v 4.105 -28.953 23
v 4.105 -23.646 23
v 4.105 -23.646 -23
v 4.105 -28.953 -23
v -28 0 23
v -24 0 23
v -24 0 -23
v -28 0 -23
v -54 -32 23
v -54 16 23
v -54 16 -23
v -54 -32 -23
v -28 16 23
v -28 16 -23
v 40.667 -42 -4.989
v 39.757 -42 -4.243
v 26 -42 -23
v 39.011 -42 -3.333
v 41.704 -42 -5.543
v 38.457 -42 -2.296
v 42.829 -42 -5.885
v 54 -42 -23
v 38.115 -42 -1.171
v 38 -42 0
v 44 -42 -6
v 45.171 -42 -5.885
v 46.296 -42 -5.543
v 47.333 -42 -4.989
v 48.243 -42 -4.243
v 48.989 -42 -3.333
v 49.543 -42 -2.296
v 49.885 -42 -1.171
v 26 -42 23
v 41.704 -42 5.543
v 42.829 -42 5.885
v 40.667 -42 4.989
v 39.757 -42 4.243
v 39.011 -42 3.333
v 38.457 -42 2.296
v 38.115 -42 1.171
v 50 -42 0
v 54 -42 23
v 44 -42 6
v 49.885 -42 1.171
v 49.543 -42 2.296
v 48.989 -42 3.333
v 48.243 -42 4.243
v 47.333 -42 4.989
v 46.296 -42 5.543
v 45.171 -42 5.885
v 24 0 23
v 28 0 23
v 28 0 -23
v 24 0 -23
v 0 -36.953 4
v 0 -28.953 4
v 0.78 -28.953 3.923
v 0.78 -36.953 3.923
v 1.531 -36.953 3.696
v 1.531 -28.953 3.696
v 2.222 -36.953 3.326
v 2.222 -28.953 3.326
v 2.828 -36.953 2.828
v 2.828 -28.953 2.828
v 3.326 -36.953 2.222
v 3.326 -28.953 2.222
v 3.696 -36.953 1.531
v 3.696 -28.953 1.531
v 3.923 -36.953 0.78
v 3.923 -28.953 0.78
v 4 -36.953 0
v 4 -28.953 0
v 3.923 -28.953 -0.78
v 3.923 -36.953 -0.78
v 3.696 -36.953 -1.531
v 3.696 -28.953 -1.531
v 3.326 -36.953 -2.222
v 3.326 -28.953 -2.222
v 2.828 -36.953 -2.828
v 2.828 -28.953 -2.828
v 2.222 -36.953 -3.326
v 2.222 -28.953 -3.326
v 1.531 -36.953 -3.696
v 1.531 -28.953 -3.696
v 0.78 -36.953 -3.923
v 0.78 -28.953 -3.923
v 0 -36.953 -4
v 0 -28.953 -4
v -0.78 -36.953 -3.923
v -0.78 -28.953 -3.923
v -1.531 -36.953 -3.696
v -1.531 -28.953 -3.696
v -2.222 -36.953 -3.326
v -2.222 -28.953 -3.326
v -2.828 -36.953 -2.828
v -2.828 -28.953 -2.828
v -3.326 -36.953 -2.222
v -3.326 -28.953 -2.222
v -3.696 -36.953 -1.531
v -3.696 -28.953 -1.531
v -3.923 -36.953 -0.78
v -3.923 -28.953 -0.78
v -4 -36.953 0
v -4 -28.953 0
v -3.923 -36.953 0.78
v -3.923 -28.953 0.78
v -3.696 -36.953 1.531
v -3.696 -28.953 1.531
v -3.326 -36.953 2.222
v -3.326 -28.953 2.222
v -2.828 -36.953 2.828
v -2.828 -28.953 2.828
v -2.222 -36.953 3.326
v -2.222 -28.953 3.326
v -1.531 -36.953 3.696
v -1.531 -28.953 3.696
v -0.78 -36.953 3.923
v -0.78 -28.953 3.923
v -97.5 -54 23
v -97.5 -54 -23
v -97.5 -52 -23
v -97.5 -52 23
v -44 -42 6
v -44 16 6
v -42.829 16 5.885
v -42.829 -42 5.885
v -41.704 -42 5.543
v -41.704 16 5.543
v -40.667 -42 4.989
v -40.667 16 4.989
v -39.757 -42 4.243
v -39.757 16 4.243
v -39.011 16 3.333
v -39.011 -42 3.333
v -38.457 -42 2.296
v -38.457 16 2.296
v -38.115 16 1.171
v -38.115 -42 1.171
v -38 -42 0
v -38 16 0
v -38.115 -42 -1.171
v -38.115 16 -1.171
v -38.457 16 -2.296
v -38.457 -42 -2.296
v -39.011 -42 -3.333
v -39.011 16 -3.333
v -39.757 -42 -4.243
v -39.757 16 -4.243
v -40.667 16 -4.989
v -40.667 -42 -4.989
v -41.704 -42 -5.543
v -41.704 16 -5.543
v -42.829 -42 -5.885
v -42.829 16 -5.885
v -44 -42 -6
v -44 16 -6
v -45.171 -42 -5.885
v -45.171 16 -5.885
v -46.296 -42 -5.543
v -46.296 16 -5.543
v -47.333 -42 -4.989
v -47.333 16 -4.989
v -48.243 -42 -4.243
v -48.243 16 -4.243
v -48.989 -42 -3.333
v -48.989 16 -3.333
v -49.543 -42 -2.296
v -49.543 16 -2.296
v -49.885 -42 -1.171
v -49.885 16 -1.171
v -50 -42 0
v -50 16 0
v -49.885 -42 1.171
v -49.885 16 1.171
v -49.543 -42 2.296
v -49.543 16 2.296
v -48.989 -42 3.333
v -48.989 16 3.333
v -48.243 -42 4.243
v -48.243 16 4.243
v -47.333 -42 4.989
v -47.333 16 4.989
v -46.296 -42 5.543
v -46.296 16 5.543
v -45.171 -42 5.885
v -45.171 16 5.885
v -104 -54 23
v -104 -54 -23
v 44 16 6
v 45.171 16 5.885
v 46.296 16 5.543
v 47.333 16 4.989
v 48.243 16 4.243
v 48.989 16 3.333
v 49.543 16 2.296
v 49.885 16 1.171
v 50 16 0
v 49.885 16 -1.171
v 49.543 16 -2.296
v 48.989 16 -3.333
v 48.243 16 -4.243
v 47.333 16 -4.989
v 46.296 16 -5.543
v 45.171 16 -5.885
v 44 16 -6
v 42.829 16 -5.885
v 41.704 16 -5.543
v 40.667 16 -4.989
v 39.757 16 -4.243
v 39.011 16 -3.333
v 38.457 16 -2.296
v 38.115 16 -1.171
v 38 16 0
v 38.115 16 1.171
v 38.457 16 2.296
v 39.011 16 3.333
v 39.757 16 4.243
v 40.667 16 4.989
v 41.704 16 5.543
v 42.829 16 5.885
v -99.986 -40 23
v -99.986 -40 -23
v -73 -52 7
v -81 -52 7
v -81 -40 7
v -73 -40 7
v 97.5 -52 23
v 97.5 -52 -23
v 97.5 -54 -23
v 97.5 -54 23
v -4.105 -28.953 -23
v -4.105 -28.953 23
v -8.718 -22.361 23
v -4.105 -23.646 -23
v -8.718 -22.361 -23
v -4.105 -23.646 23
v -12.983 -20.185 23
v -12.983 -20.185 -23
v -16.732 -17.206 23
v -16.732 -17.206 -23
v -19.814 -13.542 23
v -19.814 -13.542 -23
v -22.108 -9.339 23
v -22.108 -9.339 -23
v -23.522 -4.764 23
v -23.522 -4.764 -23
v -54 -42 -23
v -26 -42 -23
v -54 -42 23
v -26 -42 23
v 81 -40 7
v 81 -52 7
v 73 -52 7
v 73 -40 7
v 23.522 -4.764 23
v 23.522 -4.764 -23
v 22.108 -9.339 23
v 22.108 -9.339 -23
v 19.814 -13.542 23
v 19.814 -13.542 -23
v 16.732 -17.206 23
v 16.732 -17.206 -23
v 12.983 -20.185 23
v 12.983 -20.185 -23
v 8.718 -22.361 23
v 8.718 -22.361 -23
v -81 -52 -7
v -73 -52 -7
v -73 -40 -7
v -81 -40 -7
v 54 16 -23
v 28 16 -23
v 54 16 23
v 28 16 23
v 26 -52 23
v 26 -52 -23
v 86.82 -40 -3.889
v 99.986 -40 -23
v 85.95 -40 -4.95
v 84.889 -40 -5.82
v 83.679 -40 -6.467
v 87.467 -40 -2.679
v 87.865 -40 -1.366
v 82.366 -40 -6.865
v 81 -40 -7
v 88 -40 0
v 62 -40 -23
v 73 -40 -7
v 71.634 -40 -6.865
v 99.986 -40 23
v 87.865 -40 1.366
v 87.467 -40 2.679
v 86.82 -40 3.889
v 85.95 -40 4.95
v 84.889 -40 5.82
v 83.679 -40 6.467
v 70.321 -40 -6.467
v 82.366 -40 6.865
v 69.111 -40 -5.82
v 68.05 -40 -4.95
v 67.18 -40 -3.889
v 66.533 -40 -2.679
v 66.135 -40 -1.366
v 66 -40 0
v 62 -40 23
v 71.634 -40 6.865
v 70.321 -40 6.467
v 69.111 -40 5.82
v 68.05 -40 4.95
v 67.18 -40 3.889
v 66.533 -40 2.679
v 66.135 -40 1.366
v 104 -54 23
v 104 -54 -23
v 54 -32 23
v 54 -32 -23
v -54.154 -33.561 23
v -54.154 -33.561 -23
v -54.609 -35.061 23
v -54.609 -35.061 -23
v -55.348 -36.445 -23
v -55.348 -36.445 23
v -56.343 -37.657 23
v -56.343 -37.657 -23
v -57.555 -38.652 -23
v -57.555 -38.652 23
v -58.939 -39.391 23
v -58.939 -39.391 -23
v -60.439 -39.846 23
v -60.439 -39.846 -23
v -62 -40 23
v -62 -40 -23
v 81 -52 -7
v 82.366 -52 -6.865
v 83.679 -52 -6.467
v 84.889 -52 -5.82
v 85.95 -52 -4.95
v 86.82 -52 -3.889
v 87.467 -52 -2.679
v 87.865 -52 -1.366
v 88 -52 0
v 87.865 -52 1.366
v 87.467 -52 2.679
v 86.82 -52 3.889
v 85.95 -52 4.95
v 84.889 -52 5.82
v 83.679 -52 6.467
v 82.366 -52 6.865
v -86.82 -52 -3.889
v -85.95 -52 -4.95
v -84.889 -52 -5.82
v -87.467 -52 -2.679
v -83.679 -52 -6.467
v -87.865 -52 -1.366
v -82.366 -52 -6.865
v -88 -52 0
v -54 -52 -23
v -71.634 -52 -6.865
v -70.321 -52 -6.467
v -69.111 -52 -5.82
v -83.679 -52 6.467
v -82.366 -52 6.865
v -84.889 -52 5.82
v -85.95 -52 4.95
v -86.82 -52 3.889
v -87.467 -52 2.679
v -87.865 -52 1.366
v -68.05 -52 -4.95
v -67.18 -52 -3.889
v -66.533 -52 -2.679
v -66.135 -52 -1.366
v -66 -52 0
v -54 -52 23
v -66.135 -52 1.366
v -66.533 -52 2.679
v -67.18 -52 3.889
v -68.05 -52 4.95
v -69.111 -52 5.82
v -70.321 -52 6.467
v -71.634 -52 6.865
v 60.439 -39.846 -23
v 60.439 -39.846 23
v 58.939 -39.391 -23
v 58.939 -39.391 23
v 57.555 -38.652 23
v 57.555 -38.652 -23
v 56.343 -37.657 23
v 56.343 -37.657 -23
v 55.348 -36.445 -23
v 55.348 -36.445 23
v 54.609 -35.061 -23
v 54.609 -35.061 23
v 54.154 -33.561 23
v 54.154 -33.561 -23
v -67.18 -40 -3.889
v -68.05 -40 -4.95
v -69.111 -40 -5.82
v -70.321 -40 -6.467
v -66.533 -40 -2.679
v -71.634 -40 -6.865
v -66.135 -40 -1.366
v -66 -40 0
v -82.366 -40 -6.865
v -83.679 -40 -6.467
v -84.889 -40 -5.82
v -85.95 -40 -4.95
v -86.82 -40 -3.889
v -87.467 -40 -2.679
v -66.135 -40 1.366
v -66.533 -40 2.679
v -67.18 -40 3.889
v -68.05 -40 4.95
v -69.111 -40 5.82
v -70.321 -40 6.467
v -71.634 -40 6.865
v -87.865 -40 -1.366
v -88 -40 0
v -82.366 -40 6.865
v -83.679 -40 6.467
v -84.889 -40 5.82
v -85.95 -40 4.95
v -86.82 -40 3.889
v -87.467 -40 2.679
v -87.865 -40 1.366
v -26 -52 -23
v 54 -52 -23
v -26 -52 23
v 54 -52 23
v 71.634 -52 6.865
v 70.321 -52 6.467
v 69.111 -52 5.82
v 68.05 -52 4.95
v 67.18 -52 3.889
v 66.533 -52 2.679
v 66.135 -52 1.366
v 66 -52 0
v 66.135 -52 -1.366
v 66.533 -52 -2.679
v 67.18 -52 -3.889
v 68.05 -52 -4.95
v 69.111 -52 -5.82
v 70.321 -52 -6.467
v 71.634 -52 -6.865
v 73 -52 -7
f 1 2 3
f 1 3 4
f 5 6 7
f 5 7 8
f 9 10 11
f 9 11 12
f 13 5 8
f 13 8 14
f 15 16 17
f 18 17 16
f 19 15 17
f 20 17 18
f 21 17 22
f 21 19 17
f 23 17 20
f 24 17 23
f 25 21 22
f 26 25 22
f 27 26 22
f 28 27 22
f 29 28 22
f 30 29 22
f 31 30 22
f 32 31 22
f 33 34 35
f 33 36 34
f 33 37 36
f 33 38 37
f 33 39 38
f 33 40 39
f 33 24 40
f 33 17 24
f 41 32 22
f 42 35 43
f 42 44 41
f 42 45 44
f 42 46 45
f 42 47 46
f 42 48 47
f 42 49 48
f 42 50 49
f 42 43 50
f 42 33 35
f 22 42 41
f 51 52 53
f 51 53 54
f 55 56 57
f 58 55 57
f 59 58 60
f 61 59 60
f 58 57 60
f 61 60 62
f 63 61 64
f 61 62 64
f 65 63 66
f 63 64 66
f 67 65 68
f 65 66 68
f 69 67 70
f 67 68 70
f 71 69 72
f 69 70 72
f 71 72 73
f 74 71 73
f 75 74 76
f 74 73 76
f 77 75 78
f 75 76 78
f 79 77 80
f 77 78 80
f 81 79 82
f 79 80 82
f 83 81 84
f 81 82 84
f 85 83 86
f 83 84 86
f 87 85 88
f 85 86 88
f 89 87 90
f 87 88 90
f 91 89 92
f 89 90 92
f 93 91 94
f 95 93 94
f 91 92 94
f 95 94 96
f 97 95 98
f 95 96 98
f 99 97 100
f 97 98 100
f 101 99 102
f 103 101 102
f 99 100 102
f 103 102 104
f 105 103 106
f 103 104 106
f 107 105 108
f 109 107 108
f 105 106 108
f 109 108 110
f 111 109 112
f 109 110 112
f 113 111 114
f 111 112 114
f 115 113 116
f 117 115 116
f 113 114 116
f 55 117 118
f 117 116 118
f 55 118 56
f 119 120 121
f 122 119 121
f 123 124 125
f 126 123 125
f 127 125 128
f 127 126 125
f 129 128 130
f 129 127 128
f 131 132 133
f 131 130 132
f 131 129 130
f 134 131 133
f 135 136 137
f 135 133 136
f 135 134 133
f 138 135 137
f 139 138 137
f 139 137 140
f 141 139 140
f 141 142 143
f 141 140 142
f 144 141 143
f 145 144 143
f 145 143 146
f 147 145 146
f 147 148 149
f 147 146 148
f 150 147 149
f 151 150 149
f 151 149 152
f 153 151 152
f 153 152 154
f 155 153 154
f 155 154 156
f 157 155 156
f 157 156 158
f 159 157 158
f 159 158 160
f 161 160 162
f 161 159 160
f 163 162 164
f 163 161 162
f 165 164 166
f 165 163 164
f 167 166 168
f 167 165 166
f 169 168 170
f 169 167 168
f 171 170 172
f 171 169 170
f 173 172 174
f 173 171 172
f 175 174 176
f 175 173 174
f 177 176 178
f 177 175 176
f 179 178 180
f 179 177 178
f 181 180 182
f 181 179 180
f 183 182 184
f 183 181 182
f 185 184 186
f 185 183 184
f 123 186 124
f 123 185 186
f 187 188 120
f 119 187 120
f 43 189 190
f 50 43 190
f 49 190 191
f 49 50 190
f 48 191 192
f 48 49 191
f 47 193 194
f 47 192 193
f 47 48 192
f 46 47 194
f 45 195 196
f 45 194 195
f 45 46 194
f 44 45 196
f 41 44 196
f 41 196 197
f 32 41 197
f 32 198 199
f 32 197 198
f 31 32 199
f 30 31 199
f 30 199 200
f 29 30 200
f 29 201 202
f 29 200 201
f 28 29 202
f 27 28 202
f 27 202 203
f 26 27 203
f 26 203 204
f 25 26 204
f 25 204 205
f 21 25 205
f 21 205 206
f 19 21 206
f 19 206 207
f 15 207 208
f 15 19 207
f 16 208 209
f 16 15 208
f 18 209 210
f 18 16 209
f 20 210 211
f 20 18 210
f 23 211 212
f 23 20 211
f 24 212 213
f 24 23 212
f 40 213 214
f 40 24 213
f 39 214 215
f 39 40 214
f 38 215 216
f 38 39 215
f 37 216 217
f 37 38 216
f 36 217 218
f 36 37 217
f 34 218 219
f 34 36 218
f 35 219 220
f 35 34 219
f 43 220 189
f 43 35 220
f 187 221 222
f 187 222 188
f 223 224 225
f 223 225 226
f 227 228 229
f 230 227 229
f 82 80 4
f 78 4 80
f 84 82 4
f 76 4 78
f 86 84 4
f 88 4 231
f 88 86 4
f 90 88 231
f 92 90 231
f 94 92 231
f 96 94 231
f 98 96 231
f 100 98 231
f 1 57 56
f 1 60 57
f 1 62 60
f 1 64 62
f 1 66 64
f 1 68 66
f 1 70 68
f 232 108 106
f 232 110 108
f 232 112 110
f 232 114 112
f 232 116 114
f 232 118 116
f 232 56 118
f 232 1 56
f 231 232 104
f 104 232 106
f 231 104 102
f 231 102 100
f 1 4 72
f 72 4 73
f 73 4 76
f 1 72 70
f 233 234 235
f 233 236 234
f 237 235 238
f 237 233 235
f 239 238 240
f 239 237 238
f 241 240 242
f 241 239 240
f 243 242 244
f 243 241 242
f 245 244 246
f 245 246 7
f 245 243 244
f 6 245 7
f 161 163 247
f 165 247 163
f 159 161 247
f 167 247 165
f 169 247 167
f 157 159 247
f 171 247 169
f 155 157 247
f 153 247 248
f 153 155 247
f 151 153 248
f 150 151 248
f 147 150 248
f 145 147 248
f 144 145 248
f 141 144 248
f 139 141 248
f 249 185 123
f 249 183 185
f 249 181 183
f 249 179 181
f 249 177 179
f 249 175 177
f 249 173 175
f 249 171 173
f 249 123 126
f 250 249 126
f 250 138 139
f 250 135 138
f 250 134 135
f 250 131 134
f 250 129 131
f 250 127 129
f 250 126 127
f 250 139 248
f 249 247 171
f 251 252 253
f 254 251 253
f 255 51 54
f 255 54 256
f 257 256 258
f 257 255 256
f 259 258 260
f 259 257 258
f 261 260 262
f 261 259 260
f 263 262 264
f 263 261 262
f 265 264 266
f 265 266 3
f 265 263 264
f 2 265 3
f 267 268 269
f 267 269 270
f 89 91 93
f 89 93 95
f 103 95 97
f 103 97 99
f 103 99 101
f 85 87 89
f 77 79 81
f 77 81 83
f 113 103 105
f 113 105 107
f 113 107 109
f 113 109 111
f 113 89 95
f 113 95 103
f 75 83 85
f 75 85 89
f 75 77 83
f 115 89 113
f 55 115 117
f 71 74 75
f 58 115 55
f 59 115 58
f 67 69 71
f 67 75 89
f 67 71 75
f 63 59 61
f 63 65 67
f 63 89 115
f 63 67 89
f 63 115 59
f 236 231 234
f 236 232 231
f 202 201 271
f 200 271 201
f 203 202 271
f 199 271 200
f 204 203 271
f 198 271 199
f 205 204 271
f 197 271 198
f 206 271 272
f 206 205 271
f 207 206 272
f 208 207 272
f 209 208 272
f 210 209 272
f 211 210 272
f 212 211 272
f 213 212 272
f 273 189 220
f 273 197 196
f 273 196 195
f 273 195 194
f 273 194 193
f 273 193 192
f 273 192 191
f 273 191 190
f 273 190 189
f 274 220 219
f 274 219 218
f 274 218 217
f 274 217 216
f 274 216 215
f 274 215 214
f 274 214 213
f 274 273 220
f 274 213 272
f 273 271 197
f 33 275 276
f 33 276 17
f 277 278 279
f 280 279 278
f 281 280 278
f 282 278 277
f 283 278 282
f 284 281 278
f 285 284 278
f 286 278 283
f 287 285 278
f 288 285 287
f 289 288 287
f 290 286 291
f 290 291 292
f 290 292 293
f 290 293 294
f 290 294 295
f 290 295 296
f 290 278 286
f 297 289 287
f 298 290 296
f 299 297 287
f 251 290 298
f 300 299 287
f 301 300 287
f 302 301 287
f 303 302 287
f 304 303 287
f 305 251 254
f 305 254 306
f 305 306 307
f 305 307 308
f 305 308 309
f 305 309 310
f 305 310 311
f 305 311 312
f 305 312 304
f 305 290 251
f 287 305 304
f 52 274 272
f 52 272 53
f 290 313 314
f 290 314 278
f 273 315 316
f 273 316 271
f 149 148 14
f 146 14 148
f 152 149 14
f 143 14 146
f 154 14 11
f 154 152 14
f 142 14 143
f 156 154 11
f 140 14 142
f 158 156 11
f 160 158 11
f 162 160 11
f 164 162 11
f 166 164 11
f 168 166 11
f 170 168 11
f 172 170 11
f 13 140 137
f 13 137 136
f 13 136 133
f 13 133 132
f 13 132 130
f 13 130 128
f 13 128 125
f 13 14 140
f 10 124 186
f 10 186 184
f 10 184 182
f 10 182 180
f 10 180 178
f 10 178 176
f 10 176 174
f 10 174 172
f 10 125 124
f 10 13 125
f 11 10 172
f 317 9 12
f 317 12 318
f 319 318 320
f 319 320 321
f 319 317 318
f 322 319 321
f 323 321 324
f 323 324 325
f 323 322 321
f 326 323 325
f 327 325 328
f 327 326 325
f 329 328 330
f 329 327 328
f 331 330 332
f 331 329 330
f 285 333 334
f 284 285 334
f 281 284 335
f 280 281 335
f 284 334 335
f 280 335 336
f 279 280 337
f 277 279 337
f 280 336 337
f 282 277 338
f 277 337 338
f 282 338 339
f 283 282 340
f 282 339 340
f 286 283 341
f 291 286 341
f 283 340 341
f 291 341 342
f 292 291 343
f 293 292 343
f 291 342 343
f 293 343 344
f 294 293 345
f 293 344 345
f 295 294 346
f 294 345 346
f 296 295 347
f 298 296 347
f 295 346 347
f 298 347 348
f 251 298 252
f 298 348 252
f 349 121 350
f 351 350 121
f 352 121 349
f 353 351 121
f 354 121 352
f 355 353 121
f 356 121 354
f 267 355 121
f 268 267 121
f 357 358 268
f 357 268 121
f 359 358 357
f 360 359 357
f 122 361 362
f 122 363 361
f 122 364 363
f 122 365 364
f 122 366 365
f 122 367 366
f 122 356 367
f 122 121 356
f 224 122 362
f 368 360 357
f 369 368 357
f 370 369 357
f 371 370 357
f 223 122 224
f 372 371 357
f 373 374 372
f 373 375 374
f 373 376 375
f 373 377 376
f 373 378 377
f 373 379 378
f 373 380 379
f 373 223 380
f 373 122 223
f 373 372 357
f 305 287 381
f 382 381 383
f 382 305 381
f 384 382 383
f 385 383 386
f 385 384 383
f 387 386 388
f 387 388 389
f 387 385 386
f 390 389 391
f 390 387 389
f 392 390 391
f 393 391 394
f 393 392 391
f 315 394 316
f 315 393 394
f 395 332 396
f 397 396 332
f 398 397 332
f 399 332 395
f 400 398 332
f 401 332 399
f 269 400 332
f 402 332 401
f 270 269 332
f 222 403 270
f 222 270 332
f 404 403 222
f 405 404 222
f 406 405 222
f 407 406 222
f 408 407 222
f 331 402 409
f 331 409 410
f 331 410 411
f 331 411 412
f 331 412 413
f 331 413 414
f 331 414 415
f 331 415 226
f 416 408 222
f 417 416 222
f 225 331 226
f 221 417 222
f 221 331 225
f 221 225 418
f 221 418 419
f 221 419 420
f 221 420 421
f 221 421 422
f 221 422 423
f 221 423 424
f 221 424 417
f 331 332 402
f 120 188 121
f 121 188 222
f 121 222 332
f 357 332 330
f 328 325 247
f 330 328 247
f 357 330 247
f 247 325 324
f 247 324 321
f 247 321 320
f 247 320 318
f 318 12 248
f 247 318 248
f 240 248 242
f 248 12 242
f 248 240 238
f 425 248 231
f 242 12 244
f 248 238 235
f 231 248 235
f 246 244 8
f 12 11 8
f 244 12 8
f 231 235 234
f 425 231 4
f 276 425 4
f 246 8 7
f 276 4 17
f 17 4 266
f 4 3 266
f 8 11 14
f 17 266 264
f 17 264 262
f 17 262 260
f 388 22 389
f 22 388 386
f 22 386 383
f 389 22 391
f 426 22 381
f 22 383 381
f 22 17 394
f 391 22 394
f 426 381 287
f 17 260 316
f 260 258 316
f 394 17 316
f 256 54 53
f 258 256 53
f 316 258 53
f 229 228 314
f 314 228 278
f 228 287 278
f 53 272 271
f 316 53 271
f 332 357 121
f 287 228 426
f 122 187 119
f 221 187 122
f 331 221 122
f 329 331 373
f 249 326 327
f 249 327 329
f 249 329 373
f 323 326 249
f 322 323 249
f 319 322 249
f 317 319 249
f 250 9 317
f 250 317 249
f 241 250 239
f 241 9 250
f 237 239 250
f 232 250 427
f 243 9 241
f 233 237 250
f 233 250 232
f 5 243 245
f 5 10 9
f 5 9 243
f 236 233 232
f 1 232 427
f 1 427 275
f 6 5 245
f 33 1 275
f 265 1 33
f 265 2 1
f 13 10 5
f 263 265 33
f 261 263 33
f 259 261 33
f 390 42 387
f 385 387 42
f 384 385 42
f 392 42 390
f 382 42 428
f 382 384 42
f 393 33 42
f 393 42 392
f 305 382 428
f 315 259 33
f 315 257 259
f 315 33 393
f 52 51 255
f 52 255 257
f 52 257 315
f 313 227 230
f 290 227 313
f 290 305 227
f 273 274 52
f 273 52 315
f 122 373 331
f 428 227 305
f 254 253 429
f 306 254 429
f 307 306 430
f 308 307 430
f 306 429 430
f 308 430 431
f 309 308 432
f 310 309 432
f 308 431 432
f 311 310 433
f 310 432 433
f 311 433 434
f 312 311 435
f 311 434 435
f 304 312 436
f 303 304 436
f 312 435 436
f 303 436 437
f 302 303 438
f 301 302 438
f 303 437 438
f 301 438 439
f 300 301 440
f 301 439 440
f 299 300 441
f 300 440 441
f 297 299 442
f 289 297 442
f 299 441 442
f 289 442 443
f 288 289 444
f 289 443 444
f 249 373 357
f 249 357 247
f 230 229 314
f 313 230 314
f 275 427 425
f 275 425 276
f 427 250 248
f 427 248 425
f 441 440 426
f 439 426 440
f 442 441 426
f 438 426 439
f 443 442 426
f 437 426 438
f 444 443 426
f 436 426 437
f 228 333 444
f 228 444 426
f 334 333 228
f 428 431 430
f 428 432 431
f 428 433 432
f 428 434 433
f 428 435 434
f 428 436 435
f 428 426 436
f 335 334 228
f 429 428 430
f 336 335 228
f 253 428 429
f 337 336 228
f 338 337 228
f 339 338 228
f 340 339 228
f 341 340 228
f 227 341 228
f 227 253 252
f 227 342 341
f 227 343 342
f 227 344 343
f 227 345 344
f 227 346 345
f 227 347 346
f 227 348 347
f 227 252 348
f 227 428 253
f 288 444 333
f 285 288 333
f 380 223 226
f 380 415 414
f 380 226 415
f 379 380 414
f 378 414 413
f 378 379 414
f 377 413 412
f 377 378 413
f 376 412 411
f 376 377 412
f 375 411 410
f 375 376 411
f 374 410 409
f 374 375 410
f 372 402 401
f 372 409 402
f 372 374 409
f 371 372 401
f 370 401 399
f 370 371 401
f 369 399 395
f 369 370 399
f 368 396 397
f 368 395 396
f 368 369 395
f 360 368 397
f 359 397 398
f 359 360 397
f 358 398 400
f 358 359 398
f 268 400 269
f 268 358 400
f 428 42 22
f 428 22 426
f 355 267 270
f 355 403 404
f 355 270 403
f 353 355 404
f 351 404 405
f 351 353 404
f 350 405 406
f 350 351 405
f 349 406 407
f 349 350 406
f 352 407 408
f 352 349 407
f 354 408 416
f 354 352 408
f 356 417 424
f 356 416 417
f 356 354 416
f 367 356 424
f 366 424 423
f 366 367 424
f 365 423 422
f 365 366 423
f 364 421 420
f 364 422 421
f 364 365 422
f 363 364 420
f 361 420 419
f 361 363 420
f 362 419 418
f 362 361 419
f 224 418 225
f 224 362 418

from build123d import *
from OCP.BRepAlgoAPI import BRepAlgoAPI_Cut
from OCP.TopTools import TopTools_ListOfShape

# Parameters (mm, degrees)
BOSS_EXTRUDE1_DEPTH     = 23
CUT_EXTRUDE1_DEPTH      = 120.419428905
CUT_EXTRUDE1_DEPTH_BACK = 120.419428905
SKETCH2_R               = 6
CUT_EXTRUDE4_START      = -28.953391
SKETCH2_3_R             = 4
CUT_EXTRUDE4_DEPTH      = 8


with BuildPart() as part:
    # Sketch1 → Boss-Extrude1 (new, symmetric)
    with BuildSketch(Plane.XY):
        with BuildLine():
            ThreePointArc((-4.105081288, -23.646316999), (-18.364666495, -15.451181979), (-24, 0))
            Line((-24, 0), (-28, 0))
            Line((-28, 0), (-28, 16))
            Line((-28, 16), (-54, 16))
            Line((-54, 16), (-54, -32))
            ThreePointArc((-54, -32), (-56.343145751, -37.656854249), (-62, -40))
            Line((-62, -40), (-99.985564599, -40))
            Line((-99.985564599, -40), (-104, -54))
            Line((-104, -54), (-97.5, -54))
            Line((-97.5, -54), (-97.5, -52))
            Line((-97.5, -52), (-59.034606353, -52))
            Line((-59.034606353, -52), (-54, -52))
            Line((-54, -52), (-54, -42))
            Line((-54, -42), (-26, -42))
            Line((-26, -42), (-26, -52))
            Line((-26, -52), (26, -52))
            Line((26, -52), (26, -42))
            Line((26, -42), (54, -42))
            Line((54, -42), (54, -52))
            Line((54, -52), (97.5, -52))
            Line((97.5, -52), (97.5, -54))
            Line((97.5, -54), (104, -54))
            Line((104, -54), (99.985564599, -40))
            Line((99.985564599, -40), (62, -40))
            ThreePointArc((62, -40), (56.343145751, -37.656854249), (54, -32))
            Line((54, -32), (54, 16))
            Line((54, 16), (28, 16))
            Line((28, 16), (28, 0))
            Line((28, 0), (24, 0))
            ThreePointArc((24, 0), (18.364666495, -15.451181979), (4.105081288, -23.646316999))
            Line((4.105081288, -23.646316999), (4.105081288, -28.953390601))
            Line((4.105081288, -28.953390601), (-4.105081288, -28.953390601))
            Line((-4.105081288, -28.953390601), (-4.105081288, -23.646316999))
        make_face()
    extrude(amount=BOSS_EXTRUDE1_DEPTH, both=True)

    # Sketch2 → Cut-Extrude1 (cut, two sides: drawn at the far end of the back side and taken through both)
    with BuildSketch(Plane(origin=(0, 0, 0), x_dir=(1, 0, 0), z_dir=(0, 1, 0)).offset(-CUT_EXTRUDE1_DEPTH_BACK)):
        with BuildLine():
            Line((-81, -7), (-73, -7))
            ThreePointArc((-73, -7), (-66, 0), (-73, 7))
            Line((-73, 7), (-81, 7))
            ThreePointArc((-81, 7), (-88, 0), (-81, -7))
        make_face()
        with BuildLine():
            ThreePointArc((73, -7), (66, 0), (73, 7))
            Line((73, 7), (81, 7))
            ThreePointArc((81, 7), (88, 0), (81, -7))
            Line((81, -7), (73, -7))
        make_face()
        with Locations(Location((44, 0, 0), (0, 0, 270))):
            Circle(SKETCH2_R)
        with Locations(Location((-44, 0, 0), (0, 0, 270))):
            Circle(SKETCH2_R)
    extrude(amount=CUT_EXTRUDE1_DEPTH + CUT_EXTRUDE1_DEPTH_BACK, mode=Mode.SUBTRACT)


with BuildPart() as cut_extrude4_tool:
    # Sketch2<3> → Cut-Extrude4 (new body)
    with BuildSketch(Plane(origin=(0, 0, 0), x_dir=(1, 0, 0), z_dir=(0, 1, 0)).offset(CUT_EXTRUDE4_START)):
        with Locations(Location((0, 0, 0), (0, 0, 270))):
            Circle(SKETCH2_3_R)
    extrude(amount=-CUT_EXTRUDE4_DEPTH)


with BuildPart() as part_1:
    add(part.part)

    # Cut-Extrude4: cut by cut_extrude4_tool, with a tolerance
    cut_extrude4_stock = TopTools_ListOfShape()
    cut_extrude4_stock.Append(part_1.part.wrapped)
    cut_extrude4_tools = TopTools_ListOfShape()
    cut_extrude4_tools.Append(cut_extrude4_tool.part.wrapped)
    cut_extrude4_cut = BRepAlgoAPI_Cut()
    cut_extrude4_cut.SetArguments(cut_extrude4_stock)
    cut_extrude4_cut.SetTools(cut_extrude4_tools)
    cut_extrude4_cut.SetFuzzyValue(0.00001)
    cut_extrude4_cut.Build()
    add(Compound.cast(cut_extrude4_cut.Shape()).solids(), mode=Mode.REPLACE)


solid = part_1.part
